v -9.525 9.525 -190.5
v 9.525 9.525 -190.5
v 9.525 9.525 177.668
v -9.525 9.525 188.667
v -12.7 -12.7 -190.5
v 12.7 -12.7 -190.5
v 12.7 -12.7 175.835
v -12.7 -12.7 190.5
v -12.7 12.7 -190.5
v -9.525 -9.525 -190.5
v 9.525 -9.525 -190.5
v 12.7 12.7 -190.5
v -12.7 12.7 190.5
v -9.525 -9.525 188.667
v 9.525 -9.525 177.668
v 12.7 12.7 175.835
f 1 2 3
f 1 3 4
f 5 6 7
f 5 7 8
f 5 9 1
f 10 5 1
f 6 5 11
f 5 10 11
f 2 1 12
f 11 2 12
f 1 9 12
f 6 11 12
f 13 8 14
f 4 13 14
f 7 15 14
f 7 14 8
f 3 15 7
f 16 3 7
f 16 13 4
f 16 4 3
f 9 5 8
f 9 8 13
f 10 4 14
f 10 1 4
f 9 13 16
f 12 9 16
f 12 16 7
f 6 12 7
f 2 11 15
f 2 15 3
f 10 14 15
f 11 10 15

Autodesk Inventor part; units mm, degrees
ref_plane "YZ Plane" through (0, 0, 0) normal (1, 0, 0) x (0, 1, 0)
ref_plane "XZ Plane" through (0, 0, 0) normal (0, 1, 0) x (-1, 0, 0)
ref_plane "XY Plane" through (0, 0, 0) normal (0, 0, 1) x (1, 0, 0)
sketch "Sketch1" plane through (0, 0, 0) normal (0, 0, 1) x (1, 0, 0)
  line L0 (-17.78, 0) -> (17.78, 0) projected
  line L1 (0, -17.78) -> (0, 17.78) projected
  line L2 (-12.7, 12.7) -> (12.7, 12.7)
  line L3 (12.7, 12.7) -> (12.7, -12.7)
  line L4 (12.7, -12.7) -> (-12.7, -12.7)
  line L5 (-12.7, -12.7) -> (-12.7, 12.7)
  line L6 (9.525, 9.525) -> (-9.525, 9.525)
  line L7 (-9.525, 9.525) -> (-9.525, -9.525)
  line L8 (-9.525, -9.525) -> (9.525, -9.525)
  line L9 (9.525, -9.525) -> (9.525, 9.525)
  point P0 (0, 0)
  point P1 (-12.7, 0)
  point P2 (0, 12.7)
  dimension "d0" = 25.4
  dimension "d1" = 3.175
extrude "Extrusion1" add sketch "Sketch1" along normal mid plane 381 contours L5 L2 L1 L6 L7 L0 | L0 L7 L8 L1 L4 L5 | L1 L8 L9 L0 L3 L4 | L2 L3 L0 L9 L6 L1
sketch "Sketch3" plane through (-12.7, 12.7, 190.5) normal (0, 1, 0) x (1, 0, 0)
  line L0 (0, 0) -> (25.4, 0) projected
  line L1 (25.4, 0) -> (25.4, 381) projected
  line L2 (0, 0) -> (25.4, 14.6647)
  point P0 (12.7, 190.5)
  dimension "d7" = 30
extrude "Extrusion3" cut sketch "Sketch3" against normal through all
properties part number "tubing_template_0.125" material "Aluminum-6061"
